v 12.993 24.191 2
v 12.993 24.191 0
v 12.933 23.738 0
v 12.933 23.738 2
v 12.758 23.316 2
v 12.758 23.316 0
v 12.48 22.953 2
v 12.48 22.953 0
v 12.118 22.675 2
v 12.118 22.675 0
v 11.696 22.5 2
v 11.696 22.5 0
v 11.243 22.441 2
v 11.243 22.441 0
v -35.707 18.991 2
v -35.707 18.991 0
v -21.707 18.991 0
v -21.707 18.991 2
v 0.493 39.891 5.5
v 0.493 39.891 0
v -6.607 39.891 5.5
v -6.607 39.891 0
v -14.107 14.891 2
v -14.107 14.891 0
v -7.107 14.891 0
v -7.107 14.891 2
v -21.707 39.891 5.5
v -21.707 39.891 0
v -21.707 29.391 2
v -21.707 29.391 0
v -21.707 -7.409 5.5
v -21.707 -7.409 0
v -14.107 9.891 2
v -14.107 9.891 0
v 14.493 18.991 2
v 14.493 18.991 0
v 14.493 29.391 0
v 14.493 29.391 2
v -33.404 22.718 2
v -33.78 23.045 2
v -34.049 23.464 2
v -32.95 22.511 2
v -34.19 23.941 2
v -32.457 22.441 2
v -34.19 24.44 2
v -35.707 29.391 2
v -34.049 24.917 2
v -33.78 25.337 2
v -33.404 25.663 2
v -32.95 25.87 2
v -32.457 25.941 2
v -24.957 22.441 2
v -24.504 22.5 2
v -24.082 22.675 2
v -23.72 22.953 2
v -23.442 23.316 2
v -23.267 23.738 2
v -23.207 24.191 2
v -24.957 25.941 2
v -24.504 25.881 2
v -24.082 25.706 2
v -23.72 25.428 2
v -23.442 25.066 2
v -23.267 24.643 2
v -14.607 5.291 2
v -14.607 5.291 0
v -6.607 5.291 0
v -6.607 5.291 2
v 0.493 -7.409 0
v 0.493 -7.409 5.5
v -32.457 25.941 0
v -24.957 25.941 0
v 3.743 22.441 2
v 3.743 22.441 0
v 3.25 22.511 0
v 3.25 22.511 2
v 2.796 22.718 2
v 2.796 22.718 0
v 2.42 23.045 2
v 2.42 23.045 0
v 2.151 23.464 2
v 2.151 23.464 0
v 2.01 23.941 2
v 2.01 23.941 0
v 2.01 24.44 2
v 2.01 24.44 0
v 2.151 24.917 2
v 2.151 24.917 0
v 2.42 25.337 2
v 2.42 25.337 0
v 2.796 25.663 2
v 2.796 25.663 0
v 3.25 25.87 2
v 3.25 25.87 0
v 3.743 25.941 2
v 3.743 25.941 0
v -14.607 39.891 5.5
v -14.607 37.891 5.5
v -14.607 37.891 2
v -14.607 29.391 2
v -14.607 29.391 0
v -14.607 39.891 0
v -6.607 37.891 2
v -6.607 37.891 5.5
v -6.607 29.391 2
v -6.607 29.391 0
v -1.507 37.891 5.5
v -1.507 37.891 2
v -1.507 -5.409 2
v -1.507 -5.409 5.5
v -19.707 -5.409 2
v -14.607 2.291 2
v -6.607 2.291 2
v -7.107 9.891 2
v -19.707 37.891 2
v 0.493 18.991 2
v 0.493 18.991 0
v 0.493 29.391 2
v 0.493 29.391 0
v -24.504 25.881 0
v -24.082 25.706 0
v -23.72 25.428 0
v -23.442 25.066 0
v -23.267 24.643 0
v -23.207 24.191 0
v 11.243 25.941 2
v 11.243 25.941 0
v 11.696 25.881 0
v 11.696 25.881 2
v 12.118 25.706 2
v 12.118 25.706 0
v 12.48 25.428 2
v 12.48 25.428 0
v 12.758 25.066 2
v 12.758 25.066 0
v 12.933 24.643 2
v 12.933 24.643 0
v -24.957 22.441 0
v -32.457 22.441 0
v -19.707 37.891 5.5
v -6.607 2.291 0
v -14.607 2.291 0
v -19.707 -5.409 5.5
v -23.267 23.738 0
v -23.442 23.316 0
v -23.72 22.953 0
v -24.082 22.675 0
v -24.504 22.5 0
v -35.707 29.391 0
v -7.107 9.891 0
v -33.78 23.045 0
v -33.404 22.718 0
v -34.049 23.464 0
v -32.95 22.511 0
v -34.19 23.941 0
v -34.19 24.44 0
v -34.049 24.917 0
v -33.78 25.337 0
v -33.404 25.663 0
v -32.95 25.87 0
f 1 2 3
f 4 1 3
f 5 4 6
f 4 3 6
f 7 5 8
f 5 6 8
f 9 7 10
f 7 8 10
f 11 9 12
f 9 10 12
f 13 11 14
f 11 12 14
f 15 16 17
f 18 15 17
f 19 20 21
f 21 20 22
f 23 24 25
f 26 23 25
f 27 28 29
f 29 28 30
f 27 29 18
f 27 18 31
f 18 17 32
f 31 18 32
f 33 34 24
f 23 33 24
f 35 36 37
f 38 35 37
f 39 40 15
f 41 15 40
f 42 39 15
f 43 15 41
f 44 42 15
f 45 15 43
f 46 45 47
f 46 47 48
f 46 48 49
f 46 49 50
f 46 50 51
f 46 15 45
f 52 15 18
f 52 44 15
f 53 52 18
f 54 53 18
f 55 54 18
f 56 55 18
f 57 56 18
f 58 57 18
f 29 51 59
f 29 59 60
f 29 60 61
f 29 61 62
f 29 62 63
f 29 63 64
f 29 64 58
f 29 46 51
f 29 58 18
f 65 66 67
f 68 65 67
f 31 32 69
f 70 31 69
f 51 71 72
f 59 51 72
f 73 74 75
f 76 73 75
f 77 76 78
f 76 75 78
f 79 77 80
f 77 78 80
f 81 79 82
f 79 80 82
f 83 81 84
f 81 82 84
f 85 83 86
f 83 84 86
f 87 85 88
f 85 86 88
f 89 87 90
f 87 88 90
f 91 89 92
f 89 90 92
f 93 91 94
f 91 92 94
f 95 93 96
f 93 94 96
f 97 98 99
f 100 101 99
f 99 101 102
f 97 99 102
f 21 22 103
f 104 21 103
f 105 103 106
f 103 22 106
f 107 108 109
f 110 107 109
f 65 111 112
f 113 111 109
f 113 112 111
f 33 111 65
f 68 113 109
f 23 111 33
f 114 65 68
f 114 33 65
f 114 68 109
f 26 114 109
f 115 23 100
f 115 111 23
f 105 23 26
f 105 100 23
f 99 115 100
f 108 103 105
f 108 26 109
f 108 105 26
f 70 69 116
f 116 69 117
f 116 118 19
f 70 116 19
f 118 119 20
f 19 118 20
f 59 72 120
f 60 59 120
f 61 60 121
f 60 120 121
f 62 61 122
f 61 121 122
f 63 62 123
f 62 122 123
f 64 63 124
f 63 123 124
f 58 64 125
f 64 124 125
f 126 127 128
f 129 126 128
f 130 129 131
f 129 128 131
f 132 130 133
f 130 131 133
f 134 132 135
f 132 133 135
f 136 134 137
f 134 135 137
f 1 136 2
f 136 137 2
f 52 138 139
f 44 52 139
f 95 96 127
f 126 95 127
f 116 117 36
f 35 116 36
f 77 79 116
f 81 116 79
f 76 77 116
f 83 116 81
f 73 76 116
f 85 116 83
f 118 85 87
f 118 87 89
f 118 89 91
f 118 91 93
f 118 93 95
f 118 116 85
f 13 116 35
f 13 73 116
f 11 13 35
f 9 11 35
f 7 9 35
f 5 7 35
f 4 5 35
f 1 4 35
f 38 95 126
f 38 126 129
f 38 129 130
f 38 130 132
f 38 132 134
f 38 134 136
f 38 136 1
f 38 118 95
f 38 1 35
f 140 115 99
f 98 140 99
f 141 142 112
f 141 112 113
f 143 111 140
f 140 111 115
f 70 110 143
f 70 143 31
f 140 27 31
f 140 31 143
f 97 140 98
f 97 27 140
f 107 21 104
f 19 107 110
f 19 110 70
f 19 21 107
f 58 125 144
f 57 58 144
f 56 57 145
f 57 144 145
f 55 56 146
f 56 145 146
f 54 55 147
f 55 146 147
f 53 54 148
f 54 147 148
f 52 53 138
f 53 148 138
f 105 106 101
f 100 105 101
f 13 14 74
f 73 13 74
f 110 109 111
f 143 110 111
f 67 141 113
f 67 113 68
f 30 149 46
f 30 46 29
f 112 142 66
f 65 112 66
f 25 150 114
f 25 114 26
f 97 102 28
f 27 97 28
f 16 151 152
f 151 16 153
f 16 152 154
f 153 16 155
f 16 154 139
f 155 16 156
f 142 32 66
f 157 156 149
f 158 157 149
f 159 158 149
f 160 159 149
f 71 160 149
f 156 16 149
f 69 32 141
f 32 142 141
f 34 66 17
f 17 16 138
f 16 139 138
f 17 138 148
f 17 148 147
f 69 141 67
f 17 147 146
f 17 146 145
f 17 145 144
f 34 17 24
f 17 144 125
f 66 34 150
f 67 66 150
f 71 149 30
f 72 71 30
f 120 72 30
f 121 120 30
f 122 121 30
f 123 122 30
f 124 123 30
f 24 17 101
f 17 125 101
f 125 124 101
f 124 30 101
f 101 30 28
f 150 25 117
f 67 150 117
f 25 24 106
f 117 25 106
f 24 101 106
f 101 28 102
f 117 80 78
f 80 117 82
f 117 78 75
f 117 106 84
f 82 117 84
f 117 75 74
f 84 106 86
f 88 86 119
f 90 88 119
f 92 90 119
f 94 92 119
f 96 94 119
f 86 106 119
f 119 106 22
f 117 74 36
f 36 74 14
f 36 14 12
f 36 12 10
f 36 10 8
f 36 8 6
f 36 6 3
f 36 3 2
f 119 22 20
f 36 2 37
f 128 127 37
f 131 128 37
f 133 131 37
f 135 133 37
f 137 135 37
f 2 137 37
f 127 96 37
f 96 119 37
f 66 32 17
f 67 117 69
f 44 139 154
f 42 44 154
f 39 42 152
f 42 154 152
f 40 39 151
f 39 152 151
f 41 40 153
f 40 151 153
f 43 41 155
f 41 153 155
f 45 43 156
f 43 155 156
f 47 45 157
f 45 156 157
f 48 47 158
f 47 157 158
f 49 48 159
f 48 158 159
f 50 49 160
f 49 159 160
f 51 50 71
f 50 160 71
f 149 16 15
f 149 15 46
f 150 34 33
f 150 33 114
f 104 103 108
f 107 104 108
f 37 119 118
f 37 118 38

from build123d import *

# Parameters (mm, degrees)
F0_W     = 8
F0_H     = 3
F0_W_2   = 7
F0_H_2   = 5
F0_W_3   = 14
F0_H_3   = 10.4
F1_DEPTH = 2
F2_DEPTH = 5.5


with BuildPart() as f1:
    # F0 (on Top) → F1 (new body)
    with BuildSketch(Plane.XY):
        Polygon((-14.607415, 29.390514), (-14.607415, 37.890514), (-19.707415, 37.890514), (-19.707415, -5.409486), (-10.607415, -5.409486), (-1.507415, -5.409486), (-1.507415, 37.890514), (-6.607415, 37.890514), (-6.607415, 29.390514), (-10.607415, 29.390514), align=None)
        with Locations((-10.607415, 3.790514)):
            Rectangle(F0_W, F0_H, mode=Mode.SUBTRACT)
        with Locations((-10.607415, 12.390514)):
            Rectangle(F0_W_2, F0_H_2, mode=Mode.SUBTRACT)
        with Locations((7.492585, 24.190514)):
            Rectangle(F0_W_3, F0_H_3)
        with BuildLine():
            ThreePointArc((11.242585, 25.940514), (12.480022, 25.427951), (12.992585, 24.190514))
            ThreePointArc((12.992585, 24.190514), (12.480022, 22.953077), (11.242585, 22.440514))
            Line((11.242585, 22.440514), (3.742585, 22.440514))
            ThreePointArc((3.742585, 22.440514), (1.992585, 24.190514), (3.742585, 25.940514))
            Line((3.742585, 25.940514), (11.242585, 25.940514))
        make_face(mode=Mode.SUBTRACT)
        with Locations((-28.707415, 24.190514)):
            Rectangle(F0_W_3, F0_H_3)
        with BuildLine():
            ThreePointArc((-32.457415, 22.440514), (-34.207415, 24.190514), (-32.457415, 25.940514))
            Line((-32.457415, 25.940514), (-24.957415, 25.940514))
            ThreePointArc((-24.957415, 25.940514), (-23.719978, 25.427951), (-23.207415, 24.190514))
            ThreePointArc((-23.207415, 24.190514), (-23.719978, 22.953077), (-24.957415, 22.440514))
            Line((-24.957415, 22.440514), (-32.457415, 22.440514))
        make_face(mode=Mode.SUBTRACT)
    extrude(amount=F1_DEPTH)

    # F0 (on Top) → F2 (join)
    with BuildSketch(Plane.XY):
        Polygon((-19.707415, 37.890514), (-14.607415, 37.890514), (-14.607415, 39.890514), (-21.707415, 39.890514), (-21.707415, 29.390514), (-21.707415, 18.990514), (-21.707415, -7.409486), (-10.607415, -7.409486), (0.492585, -7.409486), (0.492585, 18.990514), (0.492585, 29.390514), (0.492585, 39.890514), (-6.607415, 39.890514), (-6.607415, 37.890514), (-1.507415, 37.890514), (-1.507415, -5.409486), (-10.607415, -5.409486), (-19.707415, -5.409486), align=None)
    extrude(amount=F2_DEPTH)


solid = f1.part
